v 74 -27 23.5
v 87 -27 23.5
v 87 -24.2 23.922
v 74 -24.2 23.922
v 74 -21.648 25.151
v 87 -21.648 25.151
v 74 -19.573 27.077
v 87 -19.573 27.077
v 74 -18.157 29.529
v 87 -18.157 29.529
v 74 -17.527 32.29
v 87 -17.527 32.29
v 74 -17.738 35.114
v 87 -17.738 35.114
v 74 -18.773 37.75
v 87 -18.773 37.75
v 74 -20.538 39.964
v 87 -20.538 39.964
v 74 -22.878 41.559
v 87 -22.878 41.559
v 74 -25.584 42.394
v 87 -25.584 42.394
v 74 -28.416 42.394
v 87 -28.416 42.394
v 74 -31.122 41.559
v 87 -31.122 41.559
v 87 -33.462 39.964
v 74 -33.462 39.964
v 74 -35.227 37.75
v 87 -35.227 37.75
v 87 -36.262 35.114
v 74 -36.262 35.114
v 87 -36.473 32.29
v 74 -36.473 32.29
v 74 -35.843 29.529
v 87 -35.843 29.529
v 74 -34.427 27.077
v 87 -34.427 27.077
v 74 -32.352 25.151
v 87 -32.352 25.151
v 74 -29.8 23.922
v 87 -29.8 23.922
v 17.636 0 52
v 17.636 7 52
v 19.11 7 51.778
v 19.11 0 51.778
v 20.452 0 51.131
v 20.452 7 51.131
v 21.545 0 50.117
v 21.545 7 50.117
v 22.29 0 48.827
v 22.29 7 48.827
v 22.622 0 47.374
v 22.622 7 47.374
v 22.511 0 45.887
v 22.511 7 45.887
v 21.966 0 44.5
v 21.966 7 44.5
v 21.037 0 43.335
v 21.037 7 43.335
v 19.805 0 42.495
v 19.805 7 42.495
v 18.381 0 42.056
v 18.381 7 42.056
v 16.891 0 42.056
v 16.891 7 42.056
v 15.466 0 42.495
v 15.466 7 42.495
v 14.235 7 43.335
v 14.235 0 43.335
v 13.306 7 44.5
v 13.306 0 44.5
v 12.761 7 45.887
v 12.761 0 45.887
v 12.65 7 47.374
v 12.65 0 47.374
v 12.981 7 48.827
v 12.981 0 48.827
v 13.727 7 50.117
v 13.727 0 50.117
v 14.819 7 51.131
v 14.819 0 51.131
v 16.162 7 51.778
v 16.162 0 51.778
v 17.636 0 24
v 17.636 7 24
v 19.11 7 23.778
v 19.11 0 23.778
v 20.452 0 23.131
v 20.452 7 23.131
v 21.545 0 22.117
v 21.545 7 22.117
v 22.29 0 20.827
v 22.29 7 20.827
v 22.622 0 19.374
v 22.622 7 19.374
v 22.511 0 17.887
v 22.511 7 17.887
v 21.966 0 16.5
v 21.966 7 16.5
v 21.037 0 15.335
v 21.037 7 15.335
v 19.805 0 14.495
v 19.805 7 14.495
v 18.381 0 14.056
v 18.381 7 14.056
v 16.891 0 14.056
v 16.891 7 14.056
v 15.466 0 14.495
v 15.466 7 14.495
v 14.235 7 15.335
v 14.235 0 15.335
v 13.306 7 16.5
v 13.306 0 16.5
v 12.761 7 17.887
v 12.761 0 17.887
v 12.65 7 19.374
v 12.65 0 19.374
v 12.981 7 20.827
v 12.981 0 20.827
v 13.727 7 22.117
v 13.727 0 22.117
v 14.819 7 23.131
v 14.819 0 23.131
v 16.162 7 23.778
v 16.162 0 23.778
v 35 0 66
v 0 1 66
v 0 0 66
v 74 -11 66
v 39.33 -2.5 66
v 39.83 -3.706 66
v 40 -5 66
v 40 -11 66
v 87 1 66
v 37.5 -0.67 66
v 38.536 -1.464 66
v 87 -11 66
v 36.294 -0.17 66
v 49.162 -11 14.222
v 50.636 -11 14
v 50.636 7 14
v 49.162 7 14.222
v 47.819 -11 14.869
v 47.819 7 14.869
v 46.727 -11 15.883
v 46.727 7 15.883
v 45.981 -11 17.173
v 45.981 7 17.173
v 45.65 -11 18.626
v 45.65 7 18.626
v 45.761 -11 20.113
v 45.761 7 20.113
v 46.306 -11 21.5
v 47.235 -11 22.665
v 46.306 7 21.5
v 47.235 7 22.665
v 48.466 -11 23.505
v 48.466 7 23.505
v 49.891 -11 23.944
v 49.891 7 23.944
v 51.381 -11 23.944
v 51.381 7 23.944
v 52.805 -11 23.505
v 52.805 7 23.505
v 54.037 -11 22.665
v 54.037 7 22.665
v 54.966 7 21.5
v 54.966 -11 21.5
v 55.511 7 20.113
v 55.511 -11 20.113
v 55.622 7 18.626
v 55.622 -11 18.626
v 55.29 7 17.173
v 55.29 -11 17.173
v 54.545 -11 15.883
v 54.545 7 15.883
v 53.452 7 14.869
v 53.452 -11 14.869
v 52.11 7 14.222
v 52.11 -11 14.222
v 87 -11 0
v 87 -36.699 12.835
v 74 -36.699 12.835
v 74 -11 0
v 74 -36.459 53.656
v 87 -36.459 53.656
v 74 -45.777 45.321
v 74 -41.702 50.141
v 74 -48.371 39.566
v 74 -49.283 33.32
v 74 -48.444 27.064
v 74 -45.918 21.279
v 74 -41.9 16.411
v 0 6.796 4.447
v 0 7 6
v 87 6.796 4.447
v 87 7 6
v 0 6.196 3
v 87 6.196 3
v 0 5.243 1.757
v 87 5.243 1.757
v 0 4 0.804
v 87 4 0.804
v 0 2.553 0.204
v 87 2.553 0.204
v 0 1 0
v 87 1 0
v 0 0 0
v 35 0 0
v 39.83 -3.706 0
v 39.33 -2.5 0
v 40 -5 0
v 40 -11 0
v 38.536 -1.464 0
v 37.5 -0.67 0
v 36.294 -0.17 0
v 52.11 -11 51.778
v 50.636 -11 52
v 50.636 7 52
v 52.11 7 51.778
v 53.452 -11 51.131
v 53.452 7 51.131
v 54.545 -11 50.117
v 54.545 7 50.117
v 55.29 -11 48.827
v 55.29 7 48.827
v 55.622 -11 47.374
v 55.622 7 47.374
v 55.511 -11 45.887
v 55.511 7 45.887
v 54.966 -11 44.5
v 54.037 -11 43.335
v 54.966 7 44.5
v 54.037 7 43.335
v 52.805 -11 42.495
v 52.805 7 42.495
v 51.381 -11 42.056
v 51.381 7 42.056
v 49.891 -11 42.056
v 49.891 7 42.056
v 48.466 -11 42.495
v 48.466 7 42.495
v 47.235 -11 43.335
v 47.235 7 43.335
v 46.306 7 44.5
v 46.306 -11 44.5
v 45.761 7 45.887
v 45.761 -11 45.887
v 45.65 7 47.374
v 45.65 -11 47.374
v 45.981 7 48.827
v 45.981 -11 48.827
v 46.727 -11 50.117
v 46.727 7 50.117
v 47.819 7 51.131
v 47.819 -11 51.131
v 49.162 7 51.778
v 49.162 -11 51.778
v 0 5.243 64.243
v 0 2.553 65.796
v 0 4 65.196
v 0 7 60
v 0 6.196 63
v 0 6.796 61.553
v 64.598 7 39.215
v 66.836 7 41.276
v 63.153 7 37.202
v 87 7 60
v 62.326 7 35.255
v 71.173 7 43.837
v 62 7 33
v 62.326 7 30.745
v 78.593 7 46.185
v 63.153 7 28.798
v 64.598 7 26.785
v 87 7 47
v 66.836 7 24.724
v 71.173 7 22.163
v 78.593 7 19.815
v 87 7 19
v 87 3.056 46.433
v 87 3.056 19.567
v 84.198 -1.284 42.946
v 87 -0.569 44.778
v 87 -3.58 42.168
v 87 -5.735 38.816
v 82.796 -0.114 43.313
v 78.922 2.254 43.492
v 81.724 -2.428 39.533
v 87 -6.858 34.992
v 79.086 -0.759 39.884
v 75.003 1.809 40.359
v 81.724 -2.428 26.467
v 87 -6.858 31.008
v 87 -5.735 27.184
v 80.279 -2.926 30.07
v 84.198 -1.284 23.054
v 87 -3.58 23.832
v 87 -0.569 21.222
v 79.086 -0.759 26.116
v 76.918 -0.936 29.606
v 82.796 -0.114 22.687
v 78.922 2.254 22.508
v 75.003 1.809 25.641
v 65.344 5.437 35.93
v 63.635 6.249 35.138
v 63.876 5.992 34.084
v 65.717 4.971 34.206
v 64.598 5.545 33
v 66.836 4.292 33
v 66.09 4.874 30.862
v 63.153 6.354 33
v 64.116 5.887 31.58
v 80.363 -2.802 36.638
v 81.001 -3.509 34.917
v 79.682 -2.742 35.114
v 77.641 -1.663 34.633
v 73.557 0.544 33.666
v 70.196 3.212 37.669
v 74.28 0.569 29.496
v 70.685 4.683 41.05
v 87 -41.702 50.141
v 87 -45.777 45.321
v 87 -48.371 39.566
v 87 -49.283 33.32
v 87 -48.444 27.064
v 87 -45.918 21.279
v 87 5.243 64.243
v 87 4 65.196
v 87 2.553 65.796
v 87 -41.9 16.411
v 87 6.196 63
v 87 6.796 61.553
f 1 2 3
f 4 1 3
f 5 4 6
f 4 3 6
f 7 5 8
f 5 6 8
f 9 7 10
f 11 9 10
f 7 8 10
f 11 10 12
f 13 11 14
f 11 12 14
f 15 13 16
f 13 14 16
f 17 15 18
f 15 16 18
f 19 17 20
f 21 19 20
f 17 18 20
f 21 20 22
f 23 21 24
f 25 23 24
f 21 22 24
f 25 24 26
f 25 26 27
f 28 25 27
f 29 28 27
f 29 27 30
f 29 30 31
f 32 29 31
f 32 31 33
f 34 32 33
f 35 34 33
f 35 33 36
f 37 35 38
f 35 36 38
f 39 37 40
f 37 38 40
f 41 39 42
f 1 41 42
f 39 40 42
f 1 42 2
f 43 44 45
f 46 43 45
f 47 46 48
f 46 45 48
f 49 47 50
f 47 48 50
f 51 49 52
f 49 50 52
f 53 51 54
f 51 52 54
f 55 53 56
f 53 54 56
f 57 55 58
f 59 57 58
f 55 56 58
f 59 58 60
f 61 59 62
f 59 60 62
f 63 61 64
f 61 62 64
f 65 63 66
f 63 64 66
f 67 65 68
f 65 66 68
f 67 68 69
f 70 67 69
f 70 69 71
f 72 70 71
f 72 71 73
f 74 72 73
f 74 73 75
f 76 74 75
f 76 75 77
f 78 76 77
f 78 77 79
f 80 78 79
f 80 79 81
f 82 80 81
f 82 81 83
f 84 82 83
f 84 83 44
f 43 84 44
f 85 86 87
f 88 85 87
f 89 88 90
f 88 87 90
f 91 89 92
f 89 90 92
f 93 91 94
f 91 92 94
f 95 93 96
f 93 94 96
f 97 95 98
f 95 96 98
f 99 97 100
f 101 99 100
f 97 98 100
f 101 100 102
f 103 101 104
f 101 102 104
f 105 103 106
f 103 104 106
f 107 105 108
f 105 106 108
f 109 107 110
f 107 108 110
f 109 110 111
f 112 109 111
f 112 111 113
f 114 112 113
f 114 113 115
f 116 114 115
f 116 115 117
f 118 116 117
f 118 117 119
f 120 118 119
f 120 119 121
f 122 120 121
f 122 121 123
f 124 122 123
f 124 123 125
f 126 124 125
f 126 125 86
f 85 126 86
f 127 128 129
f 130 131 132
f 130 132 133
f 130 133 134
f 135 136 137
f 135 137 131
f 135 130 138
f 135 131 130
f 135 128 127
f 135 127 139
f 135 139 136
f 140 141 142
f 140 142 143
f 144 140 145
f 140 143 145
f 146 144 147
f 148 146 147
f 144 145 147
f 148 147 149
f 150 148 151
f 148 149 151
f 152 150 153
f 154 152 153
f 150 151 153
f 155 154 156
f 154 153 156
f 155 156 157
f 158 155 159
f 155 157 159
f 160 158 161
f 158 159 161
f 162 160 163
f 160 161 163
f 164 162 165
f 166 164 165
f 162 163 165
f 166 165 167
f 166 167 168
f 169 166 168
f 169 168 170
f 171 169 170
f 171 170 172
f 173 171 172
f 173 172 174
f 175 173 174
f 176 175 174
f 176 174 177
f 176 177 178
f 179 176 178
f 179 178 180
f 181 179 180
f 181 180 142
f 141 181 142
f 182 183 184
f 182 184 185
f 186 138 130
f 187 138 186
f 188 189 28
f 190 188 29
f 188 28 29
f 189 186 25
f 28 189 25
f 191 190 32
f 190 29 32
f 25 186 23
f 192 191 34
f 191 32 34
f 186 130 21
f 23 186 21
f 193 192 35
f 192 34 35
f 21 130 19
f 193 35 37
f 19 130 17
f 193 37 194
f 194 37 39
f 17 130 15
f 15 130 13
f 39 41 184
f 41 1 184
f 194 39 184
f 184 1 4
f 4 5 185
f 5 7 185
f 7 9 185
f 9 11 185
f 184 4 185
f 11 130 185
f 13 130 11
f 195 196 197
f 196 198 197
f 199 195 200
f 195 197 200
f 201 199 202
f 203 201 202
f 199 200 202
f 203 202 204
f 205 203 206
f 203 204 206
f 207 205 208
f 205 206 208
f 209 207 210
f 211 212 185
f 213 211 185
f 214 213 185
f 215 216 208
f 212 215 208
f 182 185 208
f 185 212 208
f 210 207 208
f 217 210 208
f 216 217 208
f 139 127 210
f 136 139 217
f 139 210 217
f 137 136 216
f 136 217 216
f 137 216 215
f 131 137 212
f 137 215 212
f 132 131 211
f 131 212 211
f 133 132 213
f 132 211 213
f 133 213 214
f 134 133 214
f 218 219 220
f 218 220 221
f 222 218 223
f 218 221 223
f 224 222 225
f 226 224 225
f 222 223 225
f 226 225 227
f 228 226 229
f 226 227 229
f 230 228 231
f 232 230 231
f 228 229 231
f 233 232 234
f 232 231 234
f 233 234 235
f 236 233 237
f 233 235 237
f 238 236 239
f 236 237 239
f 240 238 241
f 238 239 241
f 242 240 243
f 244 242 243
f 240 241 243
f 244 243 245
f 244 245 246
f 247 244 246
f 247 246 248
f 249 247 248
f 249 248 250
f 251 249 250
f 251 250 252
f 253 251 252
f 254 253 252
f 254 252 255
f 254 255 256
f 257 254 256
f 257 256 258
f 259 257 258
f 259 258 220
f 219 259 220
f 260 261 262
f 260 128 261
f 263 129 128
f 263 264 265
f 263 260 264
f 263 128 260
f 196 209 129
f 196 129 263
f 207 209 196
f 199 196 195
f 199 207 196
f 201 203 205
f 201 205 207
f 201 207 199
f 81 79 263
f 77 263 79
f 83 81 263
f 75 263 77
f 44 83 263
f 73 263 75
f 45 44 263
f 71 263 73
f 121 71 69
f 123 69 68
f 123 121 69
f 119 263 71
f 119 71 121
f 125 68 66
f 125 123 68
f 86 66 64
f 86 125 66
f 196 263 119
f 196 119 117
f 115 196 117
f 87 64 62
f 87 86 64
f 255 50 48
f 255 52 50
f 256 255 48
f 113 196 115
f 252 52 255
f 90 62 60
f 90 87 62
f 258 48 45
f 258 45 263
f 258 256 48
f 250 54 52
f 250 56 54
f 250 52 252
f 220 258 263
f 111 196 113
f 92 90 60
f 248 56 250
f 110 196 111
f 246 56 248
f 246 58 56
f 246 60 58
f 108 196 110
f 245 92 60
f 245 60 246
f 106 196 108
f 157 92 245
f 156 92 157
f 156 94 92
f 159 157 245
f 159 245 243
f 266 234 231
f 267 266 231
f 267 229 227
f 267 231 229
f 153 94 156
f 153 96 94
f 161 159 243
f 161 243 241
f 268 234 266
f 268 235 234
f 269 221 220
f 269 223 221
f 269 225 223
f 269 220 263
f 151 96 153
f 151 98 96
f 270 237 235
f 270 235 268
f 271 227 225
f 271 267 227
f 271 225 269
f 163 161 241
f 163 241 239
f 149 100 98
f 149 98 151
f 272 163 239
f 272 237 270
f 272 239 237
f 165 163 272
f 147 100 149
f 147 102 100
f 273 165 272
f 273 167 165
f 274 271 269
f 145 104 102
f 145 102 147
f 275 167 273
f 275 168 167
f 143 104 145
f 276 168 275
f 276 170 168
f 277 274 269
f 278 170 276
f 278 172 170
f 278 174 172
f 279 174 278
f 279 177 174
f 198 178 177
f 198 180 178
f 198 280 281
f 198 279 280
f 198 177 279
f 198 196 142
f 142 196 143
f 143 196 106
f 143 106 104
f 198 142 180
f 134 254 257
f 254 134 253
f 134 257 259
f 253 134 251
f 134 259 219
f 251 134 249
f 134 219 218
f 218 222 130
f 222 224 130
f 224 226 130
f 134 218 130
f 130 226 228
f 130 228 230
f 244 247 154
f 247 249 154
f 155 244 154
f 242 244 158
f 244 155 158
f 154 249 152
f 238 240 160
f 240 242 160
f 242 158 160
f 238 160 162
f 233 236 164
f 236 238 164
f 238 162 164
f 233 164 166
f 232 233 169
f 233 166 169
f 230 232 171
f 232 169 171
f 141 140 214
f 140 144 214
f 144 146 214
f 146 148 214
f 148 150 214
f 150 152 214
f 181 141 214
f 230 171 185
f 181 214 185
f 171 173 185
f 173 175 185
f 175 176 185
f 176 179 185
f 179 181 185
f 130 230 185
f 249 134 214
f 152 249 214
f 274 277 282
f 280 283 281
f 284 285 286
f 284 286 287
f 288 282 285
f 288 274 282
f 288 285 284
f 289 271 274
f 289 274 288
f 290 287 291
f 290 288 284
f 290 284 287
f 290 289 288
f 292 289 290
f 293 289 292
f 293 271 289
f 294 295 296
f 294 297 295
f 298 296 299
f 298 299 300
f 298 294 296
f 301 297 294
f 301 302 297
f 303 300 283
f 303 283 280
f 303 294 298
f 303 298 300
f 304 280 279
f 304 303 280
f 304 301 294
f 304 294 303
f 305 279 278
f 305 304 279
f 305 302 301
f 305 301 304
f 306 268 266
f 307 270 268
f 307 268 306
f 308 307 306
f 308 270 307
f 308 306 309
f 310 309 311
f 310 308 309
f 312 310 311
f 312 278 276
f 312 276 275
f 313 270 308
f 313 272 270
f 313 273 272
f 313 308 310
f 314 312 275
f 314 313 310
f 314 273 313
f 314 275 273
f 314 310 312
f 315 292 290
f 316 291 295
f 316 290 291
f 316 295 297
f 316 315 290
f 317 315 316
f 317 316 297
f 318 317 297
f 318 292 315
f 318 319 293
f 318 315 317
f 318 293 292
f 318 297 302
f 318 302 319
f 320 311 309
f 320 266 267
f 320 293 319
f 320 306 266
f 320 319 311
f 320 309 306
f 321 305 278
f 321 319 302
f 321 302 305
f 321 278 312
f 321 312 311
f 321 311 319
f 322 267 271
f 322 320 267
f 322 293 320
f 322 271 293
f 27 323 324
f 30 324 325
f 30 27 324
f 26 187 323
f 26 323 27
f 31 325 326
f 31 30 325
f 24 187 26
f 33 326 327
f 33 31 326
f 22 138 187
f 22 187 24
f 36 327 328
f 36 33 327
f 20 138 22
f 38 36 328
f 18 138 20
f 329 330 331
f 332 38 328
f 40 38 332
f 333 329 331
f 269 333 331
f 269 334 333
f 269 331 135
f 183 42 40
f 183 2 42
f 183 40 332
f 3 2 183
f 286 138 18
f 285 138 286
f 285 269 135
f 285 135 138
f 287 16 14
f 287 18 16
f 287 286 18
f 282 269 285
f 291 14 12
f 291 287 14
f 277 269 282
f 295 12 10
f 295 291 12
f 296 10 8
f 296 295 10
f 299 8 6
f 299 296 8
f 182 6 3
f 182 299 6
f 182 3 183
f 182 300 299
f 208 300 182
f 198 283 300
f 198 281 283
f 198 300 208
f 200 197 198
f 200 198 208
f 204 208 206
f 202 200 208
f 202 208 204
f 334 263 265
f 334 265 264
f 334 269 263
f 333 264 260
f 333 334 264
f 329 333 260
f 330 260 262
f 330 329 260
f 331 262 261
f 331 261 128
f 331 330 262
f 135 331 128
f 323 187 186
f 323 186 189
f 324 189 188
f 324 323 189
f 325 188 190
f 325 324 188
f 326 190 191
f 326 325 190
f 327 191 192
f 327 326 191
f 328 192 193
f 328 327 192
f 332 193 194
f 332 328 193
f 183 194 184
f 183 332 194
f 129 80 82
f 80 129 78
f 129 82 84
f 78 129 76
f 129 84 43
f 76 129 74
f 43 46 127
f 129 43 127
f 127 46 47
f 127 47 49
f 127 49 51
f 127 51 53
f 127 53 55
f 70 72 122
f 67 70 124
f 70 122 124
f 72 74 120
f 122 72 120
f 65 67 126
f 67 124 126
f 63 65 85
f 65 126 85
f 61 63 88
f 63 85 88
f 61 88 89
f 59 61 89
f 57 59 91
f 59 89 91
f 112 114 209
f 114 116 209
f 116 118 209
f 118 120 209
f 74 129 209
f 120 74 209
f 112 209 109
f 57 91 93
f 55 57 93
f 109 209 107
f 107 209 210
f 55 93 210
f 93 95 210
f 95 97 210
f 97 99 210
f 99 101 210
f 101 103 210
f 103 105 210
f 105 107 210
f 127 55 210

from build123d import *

# Parameters (mm, degrees)
SKETCH1_W           = 87
SKETCH1_H           = 7
BOSS_EXTRUDE1_DEPTH = 66
FILLET1_R           = 6
SKETCH2_R           = 5
CUT_EXTRUDE1_DEPTH  = 111.675200474
SKETCH3_R           = 9.5
BOSS_EXTRUDE2_DEPTH = 13
SKETCH9_R           = 14


with BuildPart() as part:
    # Sketch1 → Boss-Extrude1 (new body)
    with BuildSketch(Plane.XY):
        with Locations((43.5, 3.5)):
            Rectangle(SKETCH1_W, SKETCH1_H)
        with BuildLine():
            ThreePointArc((35, 0), (38.535533906, -1.464466094), (40, -5))
            Line((40, -5), (40, -11))
            Line((40, -11), (87, -11))
            Line((87, -11), (87, 0))
            Line((87, 0), (35, 0))
        make_face()
    extrude(amount=BOSS_EXTRUDE1_DEPTH)

    # Fillet1
    fillet1_edges = [part.edges().sort_by_distance(p)[0] for p in [
        (43.5, 7, 66),
        (43.5, 7, 0),
    ]]
    fillet(fillet1_edges, radius=FILLET1_R)

    # Sketch2 → Cut-Extrude1 (cut, through all)
    with BuildSketch(Plane(origin=(0, 7, 0), x_dir=(1, 0, 0), z_dir=(0, 1, 0))):
        with Locations(Location((50.635865221, -47, 0), (0, 0, 270))):
            Circle(SKETCH2_R)
        with Locations(Location((17.635865221, -47, 0), (0, 0, 270))):
            Circle(SKETCH2_R)
        with Locations(Location((50.635865221, -19, 0), (0, 0, 90))):
            Circle(SKETCH2_R)
        with Locations(Location((17.635865221, -19, 0), (0, 0, 270))):
            Circle(SKETCH2_R)
    extrude(amount=-CUT_EXTRUDE1_DEPTH, mode=Mode.SUBTRACT)

    # Sketch3 → Boss-Extrude2 (add)
    with BuildSketch(Plane(origin=(87, 0, 0), x_dir=(0, 0, -1), z_dir=(1, 0, 0))):
        with BuildLine():
            Line((0, -11), (-66, -11))
            Line((-66, -11), (-53.656311688, -36.45938769))
            ThreePointArc((-53.656311688, -36.45938769), (-33.320230855, -49.283211846), (-12.834921269, -36.699144903))
            Line((-12.834921269, -36.699144903), (0, -11))
        make_face()
        with Locations((-33, -27)):
            Circle(SKETCH3_R, mode=Mode.SUBTRACT)
    extrude(amount=-BOSS_EXTRUDE2_DEPTH)

    # Cut-Sweep4: sweep along a path in Sketch8
    with BuildLine(Plane.XY.offset(33)) as cut_sweep4_path:
        Line((87, -7), (62, 7))
    # Sketch9 → Cut-Sweep4 (sweep, cut)
    with BuildSketch(Plane(origin=(87, 0, 0), x_dir=(0, 0, -1), z_dir=(1, 0, 0))):
        with Locations((-33, 7)):
            Circle(SKETCH9_R)
    sweep(path=cut_sweep4_path.line, mode=Mode.SUBTRACT)


solid = part.part
